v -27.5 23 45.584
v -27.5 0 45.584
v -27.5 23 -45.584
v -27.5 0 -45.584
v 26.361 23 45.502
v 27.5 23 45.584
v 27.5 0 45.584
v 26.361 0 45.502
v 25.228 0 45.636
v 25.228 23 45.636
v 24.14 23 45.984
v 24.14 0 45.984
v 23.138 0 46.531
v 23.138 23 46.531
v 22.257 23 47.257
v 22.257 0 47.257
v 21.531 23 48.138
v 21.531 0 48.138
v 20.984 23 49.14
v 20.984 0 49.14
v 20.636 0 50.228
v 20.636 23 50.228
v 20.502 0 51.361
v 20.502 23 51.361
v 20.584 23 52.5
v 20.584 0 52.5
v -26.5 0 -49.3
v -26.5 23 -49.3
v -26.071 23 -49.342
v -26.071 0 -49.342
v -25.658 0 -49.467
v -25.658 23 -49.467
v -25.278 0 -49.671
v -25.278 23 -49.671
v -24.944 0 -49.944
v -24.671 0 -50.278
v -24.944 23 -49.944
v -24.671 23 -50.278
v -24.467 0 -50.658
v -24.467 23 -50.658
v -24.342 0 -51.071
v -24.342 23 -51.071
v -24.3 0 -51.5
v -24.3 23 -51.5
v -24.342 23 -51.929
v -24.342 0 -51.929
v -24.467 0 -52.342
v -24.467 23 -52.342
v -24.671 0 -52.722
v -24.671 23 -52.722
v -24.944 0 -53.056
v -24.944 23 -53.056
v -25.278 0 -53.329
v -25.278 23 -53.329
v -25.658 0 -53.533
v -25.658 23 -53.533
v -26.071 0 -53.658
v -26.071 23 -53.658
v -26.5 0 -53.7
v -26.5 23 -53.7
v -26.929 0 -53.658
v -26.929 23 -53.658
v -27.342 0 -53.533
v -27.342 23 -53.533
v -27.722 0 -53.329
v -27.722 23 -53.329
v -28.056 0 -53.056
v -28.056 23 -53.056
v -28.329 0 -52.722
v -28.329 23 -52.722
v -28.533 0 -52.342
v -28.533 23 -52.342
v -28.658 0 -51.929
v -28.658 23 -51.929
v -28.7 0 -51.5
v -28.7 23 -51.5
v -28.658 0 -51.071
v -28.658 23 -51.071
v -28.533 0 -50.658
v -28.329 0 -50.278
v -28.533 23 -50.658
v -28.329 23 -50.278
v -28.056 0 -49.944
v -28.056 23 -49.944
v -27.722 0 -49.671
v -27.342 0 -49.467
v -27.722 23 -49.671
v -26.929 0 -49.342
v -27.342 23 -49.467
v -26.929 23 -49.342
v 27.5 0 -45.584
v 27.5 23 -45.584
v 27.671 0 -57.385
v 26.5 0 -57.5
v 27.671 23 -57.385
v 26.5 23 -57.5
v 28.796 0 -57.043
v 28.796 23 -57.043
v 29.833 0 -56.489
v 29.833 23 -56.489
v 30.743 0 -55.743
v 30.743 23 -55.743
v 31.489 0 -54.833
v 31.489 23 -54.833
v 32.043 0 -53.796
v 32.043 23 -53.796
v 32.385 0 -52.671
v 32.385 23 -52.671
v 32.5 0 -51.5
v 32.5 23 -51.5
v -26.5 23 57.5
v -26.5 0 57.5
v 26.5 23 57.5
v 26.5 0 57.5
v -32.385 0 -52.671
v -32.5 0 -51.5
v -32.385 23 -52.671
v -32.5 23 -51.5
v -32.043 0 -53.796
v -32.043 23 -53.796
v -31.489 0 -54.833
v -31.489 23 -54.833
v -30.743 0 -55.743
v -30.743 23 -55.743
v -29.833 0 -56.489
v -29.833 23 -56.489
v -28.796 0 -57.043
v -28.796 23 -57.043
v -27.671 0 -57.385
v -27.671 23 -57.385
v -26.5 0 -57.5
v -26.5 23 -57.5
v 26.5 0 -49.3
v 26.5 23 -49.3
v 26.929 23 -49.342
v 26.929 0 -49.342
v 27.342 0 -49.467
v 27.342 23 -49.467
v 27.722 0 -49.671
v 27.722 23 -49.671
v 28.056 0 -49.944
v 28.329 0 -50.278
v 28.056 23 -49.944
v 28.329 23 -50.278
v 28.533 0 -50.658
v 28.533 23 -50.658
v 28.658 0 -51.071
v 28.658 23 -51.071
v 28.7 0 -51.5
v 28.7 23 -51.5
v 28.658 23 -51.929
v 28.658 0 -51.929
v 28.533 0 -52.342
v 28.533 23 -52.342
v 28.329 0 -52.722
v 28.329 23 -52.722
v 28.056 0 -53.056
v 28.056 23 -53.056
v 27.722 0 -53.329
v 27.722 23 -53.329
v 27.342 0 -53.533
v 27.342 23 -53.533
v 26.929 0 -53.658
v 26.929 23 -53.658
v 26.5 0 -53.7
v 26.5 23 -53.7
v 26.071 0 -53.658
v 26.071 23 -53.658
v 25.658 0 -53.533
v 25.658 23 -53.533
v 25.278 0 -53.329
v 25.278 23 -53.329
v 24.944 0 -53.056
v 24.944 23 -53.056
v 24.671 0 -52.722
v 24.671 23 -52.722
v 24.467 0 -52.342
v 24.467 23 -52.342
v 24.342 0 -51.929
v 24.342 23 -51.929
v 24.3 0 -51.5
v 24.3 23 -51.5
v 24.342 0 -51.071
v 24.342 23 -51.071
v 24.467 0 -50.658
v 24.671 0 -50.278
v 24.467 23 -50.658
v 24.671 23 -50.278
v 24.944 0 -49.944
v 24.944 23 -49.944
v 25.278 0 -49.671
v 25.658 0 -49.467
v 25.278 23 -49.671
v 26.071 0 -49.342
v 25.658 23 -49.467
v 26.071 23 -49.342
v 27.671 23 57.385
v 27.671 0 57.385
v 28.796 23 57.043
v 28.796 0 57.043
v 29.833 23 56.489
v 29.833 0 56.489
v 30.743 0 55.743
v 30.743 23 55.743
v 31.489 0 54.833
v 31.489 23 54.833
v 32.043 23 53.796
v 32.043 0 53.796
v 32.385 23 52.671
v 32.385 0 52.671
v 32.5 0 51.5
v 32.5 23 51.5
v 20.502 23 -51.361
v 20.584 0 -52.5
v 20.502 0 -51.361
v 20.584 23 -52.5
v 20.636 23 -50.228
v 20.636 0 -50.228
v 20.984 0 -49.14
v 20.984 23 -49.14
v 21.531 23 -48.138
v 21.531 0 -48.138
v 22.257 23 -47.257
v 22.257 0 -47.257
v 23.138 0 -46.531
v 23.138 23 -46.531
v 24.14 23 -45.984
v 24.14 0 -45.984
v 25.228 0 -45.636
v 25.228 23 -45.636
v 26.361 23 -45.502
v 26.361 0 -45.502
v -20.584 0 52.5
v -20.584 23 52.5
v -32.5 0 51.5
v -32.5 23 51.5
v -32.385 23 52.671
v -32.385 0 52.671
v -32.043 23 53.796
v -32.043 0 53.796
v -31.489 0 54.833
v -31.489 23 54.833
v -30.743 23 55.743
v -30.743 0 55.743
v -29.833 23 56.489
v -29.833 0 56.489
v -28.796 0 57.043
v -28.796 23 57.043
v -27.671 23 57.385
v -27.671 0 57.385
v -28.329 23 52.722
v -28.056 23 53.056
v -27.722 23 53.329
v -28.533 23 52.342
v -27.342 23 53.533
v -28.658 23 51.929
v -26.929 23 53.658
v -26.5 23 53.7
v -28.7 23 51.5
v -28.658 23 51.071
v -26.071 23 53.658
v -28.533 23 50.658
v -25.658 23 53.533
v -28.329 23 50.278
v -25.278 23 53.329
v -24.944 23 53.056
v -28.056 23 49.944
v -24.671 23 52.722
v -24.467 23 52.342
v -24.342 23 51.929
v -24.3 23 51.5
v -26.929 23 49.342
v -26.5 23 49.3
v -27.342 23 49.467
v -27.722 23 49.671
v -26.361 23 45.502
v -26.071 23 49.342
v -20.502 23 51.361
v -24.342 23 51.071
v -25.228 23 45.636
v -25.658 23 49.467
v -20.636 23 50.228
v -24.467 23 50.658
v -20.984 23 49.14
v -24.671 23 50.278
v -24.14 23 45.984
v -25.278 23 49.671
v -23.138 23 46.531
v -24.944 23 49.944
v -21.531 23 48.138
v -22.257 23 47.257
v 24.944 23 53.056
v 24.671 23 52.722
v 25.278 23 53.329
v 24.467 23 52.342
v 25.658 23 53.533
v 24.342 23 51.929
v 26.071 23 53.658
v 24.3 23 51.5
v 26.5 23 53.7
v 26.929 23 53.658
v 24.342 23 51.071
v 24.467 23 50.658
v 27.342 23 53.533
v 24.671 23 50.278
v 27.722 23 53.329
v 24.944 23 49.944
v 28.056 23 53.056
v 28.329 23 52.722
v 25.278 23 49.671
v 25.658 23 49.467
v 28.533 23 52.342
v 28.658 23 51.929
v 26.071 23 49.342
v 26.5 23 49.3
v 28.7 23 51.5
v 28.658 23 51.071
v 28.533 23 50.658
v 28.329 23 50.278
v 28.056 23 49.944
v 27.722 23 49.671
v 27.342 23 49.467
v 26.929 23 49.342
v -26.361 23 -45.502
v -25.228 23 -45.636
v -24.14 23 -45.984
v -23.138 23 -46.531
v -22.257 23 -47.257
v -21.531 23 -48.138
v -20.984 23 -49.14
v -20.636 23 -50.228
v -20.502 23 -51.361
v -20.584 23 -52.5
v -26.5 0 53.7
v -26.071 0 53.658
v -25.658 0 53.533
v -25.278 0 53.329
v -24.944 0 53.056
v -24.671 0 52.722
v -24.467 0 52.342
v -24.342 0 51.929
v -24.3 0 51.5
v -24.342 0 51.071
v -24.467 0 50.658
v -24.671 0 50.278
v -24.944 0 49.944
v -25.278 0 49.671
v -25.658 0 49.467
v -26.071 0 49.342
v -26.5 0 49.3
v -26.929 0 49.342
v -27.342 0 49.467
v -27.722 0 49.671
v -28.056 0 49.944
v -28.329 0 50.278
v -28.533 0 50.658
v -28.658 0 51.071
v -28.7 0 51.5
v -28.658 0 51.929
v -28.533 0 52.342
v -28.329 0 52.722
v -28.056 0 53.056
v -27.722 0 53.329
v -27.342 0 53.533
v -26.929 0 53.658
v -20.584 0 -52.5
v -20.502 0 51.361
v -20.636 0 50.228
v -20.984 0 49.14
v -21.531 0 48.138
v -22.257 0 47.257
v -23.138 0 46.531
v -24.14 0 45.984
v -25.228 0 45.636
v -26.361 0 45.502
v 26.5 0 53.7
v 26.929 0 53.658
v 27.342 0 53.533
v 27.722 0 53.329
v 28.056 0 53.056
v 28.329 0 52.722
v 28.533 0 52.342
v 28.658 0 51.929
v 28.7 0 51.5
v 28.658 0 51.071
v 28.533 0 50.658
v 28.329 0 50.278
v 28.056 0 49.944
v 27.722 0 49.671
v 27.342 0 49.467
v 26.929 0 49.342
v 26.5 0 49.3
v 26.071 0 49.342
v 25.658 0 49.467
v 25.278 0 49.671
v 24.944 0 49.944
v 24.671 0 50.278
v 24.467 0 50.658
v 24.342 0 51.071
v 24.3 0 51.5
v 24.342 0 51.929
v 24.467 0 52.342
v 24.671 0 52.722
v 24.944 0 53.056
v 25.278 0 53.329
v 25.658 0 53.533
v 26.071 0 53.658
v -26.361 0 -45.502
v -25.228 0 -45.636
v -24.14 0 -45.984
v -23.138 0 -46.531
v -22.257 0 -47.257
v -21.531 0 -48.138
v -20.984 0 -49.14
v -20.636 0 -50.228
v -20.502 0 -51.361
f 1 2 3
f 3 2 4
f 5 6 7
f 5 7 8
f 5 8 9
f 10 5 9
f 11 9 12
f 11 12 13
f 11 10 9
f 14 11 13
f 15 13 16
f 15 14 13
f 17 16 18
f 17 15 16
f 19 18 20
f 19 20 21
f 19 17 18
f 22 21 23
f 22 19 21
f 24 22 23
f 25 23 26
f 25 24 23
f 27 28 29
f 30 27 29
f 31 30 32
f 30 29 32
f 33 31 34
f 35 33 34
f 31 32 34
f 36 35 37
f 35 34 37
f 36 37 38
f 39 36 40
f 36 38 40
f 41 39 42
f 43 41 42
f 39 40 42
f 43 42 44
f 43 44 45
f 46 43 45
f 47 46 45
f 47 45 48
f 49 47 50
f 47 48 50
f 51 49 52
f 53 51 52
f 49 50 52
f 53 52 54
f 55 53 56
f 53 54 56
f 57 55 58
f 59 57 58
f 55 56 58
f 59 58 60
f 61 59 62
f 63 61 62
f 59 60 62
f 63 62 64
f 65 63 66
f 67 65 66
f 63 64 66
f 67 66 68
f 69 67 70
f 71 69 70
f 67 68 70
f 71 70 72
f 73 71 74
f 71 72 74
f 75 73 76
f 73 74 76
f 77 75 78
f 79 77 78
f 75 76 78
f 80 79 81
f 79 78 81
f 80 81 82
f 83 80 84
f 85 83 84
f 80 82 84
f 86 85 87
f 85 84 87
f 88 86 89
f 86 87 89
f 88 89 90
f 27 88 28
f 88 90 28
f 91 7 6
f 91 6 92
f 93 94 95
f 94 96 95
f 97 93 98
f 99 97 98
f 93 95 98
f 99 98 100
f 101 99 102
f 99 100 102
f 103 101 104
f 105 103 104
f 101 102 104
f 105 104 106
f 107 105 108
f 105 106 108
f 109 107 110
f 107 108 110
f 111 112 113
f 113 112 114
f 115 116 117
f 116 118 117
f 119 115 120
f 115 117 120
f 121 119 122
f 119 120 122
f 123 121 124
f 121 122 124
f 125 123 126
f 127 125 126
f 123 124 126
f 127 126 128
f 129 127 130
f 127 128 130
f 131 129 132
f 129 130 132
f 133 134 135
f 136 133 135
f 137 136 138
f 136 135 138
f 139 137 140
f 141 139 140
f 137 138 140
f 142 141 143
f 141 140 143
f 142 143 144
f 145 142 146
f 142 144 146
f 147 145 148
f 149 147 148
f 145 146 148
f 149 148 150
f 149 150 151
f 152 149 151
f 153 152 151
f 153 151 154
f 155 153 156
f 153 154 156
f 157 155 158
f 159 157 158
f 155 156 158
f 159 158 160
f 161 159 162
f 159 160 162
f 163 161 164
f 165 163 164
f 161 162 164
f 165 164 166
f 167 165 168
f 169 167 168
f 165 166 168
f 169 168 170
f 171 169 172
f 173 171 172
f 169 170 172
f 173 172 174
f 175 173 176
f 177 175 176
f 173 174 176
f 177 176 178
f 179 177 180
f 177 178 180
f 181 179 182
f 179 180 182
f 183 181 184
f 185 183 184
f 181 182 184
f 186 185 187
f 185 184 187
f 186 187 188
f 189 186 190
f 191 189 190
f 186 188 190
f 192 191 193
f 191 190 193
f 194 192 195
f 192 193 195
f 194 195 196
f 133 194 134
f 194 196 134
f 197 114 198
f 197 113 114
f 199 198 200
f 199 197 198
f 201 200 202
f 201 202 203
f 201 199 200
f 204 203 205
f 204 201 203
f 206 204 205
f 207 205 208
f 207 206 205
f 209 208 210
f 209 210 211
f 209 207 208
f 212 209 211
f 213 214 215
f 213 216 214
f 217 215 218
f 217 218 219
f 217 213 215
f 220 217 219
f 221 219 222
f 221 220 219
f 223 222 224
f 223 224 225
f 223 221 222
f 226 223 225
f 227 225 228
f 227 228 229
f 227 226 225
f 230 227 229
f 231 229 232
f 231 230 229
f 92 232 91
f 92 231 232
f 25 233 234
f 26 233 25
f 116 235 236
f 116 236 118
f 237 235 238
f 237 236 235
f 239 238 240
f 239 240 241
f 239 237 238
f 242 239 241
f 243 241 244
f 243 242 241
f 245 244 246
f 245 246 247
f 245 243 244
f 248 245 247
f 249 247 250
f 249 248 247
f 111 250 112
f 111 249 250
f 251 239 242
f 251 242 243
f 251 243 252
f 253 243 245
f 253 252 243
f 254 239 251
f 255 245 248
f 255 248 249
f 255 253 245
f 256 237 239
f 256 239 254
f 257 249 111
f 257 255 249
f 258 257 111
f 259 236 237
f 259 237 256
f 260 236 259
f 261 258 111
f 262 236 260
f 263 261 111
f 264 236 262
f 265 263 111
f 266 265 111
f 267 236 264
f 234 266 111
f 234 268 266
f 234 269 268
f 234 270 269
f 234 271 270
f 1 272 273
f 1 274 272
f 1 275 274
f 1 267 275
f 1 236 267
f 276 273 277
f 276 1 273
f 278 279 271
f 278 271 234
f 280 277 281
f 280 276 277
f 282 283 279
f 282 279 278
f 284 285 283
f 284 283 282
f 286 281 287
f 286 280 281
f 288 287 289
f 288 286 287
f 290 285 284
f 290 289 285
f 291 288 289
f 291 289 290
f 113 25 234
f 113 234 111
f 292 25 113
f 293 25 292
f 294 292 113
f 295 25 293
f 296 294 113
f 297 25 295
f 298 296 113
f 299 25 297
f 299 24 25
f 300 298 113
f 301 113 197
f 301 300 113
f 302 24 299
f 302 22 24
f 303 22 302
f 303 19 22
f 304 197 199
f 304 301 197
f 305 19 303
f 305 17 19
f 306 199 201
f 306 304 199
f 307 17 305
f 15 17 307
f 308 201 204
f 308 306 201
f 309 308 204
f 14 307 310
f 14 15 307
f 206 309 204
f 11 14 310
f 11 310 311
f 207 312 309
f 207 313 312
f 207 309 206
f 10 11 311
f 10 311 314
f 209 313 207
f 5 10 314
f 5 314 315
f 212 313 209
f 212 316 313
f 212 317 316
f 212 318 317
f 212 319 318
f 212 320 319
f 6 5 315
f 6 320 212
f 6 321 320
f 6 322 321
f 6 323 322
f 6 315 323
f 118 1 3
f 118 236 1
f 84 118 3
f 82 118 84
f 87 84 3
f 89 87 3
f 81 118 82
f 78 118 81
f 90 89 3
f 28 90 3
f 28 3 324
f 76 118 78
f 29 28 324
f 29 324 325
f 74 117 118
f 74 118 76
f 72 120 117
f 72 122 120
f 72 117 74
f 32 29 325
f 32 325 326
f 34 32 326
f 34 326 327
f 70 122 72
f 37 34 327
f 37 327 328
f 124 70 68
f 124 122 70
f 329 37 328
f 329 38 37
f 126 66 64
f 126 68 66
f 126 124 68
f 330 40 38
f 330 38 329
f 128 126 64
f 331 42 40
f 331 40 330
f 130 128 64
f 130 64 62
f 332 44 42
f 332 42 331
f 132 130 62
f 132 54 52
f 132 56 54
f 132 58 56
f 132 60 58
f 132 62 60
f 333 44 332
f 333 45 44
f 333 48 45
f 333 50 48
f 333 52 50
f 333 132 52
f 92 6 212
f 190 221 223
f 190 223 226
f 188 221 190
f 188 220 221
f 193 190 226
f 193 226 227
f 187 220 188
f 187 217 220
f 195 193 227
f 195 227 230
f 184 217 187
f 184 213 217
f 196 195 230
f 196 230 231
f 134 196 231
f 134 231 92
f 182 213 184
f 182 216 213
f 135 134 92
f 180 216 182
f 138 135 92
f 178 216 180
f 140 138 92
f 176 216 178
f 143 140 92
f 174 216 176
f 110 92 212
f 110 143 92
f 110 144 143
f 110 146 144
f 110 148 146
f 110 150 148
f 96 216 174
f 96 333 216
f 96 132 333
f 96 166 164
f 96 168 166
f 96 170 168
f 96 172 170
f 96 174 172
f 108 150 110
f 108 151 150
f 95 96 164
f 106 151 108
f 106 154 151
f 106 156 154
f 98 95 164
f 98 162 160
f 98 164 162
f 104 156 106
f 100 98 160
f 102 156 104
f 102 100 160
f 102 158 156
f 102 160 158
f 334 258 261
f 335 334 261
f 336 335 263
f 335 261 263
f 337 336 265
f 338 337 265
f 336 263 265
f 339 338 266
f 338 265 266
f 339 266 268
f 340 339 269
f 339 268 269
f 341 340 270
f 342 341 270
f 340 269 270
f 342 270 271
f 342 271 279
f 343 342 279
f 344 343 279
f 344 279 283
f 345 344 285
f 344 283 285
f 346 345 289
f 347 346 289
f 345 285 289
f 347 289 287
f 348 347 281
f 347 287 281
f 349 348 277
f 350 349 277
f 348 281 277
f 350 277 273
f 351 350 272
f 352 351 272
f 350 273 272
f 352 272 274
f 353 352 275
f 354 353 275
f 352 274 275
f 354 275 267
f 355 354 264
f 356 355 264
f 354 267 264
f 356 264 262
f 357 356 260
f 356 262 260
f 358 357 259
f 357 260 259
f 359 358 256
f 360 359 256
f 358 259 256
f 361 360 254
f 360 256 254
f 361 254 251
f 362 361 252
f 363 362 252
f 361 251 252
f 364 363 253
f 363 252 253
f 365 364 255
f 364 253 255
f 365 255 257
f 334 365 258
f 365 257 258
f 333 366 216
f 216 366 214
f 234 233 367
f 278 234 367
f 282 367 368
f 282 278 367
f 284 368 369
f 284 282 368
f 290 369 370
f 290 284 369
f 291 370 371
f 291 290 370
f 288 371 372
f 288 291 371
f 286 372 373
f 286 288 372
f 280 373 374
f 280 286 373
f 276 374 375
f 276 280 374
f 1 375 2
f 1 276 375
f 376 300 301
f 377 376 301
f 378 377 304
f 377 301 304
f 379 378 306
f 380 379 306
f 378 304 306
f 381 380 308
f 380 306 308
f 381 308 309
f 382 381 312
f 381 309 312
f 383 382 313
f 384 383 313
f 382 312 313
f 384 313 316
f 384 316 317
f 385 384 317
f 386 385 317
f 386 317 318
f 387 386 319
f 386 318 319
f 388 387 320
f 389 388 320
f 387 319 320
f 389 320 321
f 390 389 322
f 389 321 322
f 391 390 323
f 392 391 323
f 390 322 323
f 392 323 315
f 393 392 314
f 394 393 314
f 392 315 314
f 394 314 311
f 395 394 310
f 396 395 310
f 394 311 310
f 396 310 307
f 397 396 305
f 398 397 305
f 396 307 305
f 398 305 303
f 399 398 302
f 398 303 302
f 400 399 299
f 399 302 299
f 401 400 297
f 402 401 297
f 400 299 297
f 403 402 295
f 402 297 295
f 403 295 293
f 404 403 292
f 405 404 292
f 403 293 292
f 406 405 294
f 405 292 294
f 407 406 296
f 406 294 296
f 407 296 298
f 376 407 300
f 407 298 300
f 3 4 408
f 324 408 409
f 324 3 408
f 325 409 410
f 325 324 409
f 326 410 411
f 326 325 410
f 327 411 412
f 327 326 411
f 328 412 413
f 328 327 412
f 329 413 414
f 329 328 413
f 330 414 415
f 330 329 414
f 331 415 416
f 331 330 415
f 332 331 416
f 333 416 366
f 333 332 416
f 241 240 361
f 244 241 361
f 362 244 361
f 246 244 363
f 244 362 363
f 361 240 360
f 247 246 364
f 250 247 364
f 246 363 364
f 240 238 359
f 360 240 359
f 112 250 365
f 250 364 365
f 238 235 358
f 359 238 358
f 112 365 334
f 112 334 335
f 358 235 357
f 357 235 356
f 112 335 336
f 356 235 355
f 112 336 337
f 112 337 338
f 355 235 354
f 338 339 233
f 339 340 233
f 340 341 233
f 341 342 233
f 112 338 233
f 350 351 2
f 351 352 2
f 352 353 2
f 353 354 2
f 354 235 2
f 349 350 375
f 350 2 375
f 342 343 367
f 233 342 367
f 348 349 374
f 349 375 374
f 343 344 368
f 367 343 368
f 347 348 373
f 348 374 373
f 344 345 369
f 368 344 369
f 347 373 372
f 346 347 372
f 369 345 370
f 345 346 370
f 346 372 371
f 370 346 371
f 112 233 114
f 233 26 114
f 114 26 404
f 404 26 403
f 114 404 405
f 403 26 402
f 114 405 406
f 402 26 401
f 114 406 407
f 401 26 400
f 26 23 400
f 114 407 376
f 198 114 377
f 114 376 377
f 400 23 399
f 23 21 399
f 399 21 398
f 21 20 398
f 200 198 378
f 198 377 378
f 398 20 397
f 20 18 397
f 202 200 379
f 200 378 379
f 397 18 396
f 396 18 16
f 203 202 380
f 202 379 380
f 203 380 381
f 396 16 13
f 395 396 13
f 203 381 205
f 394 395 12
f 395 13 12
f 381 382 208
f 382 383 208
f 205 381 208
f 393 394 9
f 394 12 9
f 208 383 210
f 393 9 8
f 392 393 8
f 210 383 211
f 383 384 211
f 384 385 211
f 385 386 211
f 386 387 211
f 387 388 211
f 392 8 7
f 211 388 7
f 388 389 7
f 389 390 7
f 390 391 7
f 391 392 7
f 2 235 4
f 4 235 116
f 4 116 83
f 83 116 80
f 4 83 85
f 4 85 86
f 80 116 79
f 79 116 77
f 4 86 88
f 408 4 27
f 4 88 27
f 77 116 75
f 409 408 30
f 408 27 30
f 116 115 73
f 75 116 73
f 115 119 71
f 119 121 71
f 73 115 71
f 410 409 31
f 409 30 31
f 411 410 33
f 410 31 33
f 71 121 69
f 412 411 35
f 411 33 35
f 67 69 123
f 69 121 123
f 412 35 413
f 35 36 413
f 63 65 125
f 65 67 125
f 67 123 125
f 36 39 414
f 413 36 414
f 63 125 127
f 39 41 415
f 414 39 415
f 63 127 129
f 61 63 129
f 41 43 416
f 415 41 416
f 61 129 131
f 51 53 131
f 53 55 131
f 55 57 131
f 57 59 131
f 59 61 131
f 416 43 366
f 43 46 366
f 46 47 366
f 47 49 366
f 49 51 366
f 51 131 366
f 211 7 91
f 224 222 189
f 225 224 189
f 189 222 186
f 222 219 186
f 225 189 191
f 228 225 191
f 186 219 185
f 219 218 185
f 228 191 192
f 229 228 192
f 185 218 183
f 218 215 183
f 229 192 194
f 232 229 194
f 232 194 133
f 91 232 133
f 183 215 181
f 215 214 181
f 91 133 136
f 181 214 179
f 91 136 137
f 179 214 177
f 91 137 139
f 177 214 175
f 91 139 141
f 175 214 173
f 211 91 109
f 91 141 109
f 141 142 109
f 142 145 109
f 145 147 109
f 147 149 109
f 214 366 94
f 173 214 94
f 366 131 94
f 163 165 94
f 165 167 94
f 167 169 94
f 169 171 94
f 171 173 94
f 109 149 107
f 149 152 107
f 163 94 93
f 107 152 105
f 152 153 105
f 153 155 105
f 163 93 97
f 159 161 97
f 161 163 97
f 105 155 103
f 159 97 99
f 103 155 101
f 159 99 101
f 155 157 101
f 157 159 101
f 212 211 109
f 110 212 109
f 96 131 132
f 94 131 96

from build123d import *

# Parameters (mm, degrees)
SKETCH1_W           = 65
SKETCH1_H           = 115
SKETCH1_W_2         = 55
SKETCH1_H_2         = 105
BOSS_EXTRUDE1_DEPTH = 23
FILLET1_R           = 6
SKETCH2_R           = 6
BOSS_EXTRUDE2_DEPTH = 23
SKETCH4_R           = 2.2
CUT_EXTRUDE1_DEPTH  = 23


with BuildPart() as part:
    # Sketch1 → Boss-Extrude1 (new body)
    with BuildSketch(Plane(origin=(0, 0, 0), x_dir=(1, 0, 0), z_dir=(0, 1, 0))):
        Rectangle(SKETCH1_W, SKETCH1_H)
        Rectangle(SKETCH1_W_2, SKETCH1_H_2, mode=Mode.SUBTRACT)
    extrude(amount=BOSS_EXTRUDE1_DEPTH)

    # Fillet1
    fillet1_edges = [part.edges().sort_by_distance(p)[0] for p in [
        (32.5, 11.5, 57.5),
        (-32.5, 11.5, 57.5),
        (-32.5, 11.5, -57.5),
        (32.5, 11.5, -57.5),
    ]]
    fillet(fillet1_edges, radius=FILLET1_R)

    # Sketch2 → Boss-Extrude2 (add)
    with BuildSketch(Plane(origin=(0, 23, 0), x_dir=(1, 0, 0), z_dir=(0, 1, 0))):
        with Locations((-26.5, 51.5)):
            Circle(SKETCH2_R)
        with Locations((26.5, 51.5)):
            Circle(SKETCH2_R)
        with Locations((-26.5, -51.5)):
            Circle(SKETCH2_R)
        with Locations((26.5, -51.5)):
            Circle(SKETCH2_R)
    extrude(amount=-BOSS_EXTRUDE2_DEPTH)

    # Sketch4 → Cut-Extrude1 (cut)
    with BuildSketch(Plane(origin=(0, 23, 0), x_dir=(1, 0, 0), z_dir=(0, 1, 0))):
        with Locations(Location((-26.5, 51.5, 0), (0, 0, 270))):
            Circle(SKETCH4_R)
        with Locations(Location((26.5, 51.5, 0), (0, 0, 270))):
            Circle(SKETCH4_R)
        with Locations(Location((26.5, -51.5, 0), (0, 0, 270))):
            Circle(SKETCH4_R)
        with Locations(Location((-26.5, -51.5, 0), (0, 0, 270))):
            Circle(SKETCH4_R)
    extrude(amount=-CUT_EXTRUDE1_DEPTH, mode=Mode.SUBTRACT)


solid = part.part
